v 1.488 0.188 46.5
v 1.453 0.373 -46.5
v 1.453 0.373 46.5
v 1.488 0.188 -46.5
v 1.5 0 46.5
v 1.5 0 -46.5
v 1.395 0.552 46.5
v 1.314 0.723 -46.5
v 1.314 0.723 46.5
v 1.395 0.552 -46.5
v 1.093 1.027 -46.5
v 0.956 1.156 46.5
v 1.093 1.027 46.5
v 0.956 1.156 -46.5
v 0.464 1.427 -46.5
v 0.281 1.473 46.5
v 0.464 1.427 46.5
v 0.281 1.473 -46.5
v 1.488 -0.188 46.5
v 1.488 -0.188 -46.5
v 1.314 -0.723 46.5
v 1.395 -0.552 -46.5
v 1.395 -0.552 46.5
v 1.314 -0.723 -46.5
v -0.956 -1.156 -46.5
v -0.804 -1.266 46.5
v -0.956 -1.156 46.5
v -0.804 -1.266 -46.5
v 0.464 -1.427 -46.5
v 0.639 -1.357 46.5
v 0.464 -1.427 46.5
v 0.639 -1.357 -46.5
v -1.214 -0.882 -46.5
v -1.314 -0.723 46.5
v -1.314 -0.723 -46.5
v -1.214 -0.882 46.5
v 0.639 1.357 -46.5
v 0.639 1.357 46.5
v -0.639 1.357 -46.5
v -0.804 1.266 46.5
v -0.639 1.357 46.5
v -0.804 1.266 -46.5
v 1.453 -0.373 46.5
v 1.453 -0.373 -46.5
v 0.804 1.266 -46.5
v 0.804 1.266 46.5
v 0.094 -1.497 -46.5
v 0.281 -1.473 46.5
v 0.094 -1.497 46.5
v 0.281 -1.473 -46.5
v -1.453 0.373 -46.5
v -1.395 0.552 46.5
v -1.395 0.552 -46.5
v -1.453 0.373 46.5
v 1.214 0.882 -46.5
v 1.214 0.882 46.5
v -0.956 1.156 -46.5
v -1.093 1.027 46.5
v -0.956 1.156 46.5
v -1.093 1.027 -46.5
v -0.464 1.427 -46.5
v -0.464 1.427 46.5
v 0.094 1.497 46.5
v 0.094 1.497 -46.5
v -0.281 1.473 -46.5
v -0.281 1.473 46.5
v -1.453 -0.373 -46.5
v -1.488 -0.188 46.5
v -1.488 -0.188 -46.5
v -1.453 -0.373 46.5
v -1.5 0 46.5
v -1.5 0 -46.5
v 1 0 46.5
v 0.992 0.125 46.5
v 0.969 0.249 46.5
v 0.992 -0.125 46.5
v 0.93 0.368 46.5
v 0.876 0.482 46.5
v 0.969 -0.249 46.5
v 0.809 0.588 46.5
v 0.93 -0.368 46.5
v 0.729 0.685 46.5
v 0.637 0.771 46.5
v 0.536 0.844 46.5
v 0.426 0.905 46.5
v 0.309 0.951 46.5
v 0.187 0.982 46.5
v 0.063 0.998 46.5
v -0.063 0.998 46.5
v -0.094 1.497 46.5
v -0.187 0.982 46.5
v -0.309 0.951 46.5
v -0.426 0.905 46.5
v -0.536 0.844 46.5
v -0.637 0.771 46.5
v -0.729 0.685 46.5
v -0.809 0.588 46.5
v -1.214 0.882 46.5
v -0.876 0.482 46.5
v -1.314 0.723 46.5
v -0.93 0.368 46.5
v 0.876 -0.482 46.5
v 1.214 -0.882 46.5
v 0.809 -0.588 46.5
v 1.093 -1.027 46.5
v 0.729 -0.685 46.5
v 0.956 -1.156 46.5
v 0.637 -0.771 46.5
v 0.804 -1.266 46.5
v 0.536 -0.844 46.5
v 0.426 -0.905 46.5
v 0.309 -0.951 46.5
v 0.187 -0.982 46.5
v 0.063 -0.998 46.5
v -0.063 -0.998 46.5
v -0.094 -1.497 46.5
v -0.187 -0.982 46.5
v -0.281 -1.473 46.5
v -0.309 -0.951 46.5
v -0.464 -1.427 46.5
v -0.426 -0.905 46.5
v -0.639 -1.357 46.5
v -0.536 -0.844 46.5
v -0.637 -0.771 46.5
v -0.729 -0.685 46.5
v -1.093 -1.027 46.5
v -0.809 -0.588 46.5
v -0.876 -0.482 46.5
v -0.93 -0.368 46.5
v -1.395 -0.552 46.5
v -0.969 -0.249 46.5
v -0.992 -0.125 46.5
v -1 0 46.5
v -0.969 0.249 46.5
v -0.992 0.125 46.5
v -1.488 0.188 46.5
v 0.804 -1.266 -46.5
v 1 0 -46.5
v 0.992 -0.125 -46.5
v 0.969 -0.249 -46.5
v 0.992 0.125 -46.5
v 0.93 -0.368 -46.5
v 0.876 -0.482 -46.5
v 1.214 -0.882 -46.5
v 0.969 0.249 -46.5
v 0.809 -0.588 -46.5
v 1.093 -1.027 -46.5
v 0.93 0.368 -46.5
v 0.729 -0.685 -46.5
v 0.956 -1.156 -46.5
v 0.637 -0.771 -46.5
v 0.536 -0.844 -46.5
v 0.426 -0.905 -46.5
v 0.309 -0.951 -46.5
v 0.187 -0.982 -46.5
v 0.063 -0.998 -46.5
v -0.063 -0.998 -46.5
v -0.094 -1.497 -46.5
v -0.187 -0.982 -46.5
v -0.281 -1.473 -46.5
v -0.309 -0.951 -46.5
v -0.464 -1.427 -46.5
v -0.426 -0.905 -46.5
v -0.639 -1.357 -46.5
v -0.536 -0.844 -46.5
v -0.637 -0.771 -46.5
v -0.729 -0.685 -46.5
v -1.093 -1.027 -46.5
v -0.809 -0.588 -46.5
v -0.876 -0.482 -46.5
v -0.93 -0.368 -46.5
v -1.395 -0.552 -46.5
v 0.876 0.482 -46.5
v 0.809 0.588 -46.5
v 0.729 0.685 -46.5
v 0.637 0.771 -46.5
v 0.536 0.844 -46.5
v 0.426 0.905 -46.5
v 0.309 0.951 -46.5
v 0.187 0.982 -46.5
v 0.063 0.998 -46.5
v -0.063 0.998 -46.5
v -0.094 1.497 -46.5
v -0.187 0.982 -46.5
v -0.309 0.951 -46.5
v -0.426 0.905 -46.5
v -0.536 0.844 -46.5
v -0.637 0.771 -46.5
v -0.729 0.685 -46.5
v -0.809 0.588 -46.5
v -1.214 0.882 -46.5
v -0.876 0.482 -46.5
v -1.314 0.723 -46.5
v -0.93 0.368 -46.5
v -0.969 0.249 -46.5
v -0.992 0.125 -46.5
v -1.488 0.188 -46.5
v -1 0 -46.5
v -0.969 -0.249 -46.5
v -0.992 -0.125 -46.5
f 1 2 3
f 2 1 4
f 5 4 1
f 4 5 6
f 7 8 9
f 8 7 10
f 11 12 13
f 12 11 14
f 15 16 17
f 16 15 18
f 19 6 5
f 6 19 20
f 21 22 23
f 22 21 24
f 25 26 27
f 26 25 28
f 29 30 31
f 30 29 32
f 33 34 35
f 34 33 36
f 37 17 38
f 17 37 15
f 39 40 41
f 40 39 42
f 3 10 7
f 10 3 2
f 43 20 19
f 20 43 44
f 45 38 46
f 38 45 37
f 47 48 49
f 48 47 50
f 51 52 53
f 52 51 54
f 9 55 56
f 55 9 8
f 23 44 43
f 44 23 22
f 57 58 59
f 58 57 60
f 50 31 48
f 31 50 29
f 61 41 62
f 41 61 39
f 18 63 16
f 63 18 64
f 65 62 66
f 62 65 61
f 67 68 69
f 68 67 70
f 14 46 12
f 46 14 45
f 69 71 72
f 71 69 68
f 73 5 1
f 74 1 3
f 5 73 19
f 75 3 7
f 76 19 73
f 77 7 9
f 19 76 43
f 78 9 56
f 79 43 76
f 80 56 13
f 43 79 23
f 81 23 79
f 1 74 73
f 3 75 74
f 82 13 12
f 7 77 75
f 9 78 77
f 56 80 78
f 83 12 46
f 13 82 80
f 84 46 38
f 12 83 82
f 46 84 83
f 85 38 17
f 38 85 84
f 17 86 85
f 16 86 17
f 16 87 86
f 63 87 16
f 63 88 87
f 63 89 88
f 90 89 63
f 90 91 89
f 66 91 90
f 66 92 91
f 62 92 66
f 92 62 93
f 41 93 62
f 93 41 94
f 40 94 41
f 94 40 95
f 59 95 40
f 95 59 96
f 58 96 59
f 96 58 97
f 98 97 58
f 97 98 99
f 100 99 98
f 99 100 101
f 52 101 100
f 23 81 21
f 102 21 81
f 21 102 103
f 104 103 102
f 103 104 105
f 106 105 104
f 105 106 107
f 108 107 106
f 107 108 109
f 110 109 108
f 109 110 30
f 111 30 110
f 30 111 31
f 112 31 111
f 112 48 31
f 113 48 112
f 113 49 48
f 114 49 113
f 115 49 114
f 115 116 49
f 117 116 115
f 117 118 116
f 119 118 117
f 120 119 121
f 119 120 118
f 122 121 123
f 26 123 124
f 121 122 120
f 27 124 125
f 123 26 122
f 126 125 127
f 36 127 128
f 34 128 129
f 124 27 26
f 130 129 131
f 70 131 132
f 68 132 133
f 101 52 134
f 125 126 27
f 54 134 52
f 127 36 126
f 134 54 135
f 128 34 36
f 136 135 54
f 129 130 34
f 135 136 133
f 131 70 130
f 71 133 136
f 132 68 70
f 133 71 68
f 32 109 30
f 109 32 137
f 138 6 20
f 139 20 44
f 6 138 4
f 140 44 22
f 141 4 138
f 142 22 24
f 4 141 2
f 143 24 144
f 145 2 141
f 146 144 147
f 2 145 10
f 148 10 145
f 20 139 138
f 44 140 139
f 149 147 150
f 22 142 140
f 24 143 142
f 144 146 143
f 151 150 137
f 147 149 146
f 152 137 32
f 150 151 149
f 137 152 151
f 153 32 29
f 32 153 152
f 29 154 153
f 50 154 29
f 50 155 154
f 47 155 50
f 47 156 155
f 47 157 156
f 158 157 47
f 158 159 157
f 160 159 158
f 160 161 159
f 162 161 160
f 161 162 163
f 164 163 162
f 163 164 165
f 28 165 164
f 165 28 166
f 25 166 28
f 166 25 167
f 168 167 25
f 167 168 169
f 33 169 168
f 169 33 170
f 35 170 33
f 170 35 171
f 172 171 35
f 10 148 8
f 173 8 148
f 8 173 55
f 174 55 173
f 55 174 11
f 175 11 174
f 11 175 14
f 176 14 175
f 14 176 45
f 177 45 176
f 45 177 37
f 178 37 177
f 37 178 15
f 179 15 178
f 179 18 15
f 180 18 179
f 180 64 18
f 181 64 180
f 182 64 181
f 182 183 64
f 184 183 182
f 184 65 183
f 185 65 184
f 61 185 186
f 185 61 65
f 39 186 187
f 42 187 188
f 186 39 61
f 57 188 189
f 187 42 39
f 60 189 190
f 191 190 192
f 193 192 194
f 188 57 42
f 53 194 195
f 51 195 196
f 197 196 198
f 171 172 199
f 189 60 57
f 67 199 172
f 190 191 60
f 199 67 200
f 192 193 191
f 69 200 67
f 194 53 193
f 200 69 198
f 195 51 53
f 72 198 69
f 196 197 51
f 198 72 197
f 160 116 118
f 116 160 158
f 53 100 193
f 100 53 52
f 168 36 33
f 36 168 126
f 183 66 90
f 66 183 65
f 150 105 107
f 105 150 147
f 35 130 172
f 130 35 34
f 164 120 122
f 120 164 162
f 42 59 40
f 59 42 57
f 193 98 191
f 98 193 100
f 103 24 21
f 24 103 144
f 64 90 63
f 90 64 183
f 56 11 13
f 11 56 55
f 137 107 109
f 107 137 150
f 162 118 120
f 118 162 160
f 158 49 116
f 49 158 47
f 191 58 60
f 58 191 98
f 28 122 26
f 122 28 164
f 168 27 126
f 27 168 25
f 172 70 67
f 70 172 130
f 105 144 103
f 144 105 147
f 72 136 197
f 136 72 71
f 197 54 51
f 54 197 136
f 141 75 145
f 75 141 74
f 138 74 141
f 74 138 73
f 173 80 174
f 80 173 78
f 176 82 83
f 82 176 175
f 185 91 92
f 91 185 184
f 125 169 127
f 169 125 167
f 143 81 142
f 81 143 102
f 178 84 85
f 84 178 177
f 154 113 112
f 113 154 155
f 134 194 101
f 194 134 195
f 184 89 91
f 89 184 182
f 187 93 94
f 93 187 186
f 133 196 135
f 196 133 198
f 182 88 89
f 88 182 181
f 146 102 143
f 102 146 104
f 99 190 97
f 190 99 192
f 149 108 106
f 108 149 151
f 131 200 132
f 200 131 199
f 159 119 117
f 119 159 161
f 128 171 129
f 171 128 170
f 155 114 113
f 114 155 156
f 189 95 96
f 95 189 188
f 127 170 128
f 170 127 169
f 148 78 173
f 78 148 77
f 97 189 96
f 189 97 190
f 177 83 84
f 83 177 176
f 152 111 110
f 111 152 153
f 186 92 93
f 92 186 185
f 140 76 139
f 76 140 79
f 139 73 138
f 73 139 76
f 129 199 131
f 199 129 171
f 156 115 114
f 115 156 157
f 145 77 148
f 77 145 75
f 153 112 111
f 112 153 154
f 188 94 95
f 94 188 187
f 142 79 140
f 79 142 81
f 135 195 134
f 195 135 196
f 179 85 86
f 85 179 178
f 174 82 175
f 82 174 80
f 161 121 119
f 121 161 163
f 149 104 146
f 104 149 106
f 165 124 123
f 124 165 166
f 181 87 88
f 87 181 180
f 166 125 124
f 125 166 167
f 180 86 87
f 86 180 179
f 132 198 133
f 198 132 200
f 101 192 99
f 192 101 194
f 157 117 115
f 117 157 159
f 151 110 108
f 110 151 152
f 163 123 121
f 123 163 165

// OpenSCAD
$fn = 50;


difference() {
	union() {
		translate(v = [0, 0, -46.5000000000]) {
			cylinder(h = 93, r = 1.5000000000);
		}
	}
	union() {
		translate(v = [0, 0, -100.0000000000]) {
			cylinder(h = 200, r = 1.0000000000);
		}
	}
}
